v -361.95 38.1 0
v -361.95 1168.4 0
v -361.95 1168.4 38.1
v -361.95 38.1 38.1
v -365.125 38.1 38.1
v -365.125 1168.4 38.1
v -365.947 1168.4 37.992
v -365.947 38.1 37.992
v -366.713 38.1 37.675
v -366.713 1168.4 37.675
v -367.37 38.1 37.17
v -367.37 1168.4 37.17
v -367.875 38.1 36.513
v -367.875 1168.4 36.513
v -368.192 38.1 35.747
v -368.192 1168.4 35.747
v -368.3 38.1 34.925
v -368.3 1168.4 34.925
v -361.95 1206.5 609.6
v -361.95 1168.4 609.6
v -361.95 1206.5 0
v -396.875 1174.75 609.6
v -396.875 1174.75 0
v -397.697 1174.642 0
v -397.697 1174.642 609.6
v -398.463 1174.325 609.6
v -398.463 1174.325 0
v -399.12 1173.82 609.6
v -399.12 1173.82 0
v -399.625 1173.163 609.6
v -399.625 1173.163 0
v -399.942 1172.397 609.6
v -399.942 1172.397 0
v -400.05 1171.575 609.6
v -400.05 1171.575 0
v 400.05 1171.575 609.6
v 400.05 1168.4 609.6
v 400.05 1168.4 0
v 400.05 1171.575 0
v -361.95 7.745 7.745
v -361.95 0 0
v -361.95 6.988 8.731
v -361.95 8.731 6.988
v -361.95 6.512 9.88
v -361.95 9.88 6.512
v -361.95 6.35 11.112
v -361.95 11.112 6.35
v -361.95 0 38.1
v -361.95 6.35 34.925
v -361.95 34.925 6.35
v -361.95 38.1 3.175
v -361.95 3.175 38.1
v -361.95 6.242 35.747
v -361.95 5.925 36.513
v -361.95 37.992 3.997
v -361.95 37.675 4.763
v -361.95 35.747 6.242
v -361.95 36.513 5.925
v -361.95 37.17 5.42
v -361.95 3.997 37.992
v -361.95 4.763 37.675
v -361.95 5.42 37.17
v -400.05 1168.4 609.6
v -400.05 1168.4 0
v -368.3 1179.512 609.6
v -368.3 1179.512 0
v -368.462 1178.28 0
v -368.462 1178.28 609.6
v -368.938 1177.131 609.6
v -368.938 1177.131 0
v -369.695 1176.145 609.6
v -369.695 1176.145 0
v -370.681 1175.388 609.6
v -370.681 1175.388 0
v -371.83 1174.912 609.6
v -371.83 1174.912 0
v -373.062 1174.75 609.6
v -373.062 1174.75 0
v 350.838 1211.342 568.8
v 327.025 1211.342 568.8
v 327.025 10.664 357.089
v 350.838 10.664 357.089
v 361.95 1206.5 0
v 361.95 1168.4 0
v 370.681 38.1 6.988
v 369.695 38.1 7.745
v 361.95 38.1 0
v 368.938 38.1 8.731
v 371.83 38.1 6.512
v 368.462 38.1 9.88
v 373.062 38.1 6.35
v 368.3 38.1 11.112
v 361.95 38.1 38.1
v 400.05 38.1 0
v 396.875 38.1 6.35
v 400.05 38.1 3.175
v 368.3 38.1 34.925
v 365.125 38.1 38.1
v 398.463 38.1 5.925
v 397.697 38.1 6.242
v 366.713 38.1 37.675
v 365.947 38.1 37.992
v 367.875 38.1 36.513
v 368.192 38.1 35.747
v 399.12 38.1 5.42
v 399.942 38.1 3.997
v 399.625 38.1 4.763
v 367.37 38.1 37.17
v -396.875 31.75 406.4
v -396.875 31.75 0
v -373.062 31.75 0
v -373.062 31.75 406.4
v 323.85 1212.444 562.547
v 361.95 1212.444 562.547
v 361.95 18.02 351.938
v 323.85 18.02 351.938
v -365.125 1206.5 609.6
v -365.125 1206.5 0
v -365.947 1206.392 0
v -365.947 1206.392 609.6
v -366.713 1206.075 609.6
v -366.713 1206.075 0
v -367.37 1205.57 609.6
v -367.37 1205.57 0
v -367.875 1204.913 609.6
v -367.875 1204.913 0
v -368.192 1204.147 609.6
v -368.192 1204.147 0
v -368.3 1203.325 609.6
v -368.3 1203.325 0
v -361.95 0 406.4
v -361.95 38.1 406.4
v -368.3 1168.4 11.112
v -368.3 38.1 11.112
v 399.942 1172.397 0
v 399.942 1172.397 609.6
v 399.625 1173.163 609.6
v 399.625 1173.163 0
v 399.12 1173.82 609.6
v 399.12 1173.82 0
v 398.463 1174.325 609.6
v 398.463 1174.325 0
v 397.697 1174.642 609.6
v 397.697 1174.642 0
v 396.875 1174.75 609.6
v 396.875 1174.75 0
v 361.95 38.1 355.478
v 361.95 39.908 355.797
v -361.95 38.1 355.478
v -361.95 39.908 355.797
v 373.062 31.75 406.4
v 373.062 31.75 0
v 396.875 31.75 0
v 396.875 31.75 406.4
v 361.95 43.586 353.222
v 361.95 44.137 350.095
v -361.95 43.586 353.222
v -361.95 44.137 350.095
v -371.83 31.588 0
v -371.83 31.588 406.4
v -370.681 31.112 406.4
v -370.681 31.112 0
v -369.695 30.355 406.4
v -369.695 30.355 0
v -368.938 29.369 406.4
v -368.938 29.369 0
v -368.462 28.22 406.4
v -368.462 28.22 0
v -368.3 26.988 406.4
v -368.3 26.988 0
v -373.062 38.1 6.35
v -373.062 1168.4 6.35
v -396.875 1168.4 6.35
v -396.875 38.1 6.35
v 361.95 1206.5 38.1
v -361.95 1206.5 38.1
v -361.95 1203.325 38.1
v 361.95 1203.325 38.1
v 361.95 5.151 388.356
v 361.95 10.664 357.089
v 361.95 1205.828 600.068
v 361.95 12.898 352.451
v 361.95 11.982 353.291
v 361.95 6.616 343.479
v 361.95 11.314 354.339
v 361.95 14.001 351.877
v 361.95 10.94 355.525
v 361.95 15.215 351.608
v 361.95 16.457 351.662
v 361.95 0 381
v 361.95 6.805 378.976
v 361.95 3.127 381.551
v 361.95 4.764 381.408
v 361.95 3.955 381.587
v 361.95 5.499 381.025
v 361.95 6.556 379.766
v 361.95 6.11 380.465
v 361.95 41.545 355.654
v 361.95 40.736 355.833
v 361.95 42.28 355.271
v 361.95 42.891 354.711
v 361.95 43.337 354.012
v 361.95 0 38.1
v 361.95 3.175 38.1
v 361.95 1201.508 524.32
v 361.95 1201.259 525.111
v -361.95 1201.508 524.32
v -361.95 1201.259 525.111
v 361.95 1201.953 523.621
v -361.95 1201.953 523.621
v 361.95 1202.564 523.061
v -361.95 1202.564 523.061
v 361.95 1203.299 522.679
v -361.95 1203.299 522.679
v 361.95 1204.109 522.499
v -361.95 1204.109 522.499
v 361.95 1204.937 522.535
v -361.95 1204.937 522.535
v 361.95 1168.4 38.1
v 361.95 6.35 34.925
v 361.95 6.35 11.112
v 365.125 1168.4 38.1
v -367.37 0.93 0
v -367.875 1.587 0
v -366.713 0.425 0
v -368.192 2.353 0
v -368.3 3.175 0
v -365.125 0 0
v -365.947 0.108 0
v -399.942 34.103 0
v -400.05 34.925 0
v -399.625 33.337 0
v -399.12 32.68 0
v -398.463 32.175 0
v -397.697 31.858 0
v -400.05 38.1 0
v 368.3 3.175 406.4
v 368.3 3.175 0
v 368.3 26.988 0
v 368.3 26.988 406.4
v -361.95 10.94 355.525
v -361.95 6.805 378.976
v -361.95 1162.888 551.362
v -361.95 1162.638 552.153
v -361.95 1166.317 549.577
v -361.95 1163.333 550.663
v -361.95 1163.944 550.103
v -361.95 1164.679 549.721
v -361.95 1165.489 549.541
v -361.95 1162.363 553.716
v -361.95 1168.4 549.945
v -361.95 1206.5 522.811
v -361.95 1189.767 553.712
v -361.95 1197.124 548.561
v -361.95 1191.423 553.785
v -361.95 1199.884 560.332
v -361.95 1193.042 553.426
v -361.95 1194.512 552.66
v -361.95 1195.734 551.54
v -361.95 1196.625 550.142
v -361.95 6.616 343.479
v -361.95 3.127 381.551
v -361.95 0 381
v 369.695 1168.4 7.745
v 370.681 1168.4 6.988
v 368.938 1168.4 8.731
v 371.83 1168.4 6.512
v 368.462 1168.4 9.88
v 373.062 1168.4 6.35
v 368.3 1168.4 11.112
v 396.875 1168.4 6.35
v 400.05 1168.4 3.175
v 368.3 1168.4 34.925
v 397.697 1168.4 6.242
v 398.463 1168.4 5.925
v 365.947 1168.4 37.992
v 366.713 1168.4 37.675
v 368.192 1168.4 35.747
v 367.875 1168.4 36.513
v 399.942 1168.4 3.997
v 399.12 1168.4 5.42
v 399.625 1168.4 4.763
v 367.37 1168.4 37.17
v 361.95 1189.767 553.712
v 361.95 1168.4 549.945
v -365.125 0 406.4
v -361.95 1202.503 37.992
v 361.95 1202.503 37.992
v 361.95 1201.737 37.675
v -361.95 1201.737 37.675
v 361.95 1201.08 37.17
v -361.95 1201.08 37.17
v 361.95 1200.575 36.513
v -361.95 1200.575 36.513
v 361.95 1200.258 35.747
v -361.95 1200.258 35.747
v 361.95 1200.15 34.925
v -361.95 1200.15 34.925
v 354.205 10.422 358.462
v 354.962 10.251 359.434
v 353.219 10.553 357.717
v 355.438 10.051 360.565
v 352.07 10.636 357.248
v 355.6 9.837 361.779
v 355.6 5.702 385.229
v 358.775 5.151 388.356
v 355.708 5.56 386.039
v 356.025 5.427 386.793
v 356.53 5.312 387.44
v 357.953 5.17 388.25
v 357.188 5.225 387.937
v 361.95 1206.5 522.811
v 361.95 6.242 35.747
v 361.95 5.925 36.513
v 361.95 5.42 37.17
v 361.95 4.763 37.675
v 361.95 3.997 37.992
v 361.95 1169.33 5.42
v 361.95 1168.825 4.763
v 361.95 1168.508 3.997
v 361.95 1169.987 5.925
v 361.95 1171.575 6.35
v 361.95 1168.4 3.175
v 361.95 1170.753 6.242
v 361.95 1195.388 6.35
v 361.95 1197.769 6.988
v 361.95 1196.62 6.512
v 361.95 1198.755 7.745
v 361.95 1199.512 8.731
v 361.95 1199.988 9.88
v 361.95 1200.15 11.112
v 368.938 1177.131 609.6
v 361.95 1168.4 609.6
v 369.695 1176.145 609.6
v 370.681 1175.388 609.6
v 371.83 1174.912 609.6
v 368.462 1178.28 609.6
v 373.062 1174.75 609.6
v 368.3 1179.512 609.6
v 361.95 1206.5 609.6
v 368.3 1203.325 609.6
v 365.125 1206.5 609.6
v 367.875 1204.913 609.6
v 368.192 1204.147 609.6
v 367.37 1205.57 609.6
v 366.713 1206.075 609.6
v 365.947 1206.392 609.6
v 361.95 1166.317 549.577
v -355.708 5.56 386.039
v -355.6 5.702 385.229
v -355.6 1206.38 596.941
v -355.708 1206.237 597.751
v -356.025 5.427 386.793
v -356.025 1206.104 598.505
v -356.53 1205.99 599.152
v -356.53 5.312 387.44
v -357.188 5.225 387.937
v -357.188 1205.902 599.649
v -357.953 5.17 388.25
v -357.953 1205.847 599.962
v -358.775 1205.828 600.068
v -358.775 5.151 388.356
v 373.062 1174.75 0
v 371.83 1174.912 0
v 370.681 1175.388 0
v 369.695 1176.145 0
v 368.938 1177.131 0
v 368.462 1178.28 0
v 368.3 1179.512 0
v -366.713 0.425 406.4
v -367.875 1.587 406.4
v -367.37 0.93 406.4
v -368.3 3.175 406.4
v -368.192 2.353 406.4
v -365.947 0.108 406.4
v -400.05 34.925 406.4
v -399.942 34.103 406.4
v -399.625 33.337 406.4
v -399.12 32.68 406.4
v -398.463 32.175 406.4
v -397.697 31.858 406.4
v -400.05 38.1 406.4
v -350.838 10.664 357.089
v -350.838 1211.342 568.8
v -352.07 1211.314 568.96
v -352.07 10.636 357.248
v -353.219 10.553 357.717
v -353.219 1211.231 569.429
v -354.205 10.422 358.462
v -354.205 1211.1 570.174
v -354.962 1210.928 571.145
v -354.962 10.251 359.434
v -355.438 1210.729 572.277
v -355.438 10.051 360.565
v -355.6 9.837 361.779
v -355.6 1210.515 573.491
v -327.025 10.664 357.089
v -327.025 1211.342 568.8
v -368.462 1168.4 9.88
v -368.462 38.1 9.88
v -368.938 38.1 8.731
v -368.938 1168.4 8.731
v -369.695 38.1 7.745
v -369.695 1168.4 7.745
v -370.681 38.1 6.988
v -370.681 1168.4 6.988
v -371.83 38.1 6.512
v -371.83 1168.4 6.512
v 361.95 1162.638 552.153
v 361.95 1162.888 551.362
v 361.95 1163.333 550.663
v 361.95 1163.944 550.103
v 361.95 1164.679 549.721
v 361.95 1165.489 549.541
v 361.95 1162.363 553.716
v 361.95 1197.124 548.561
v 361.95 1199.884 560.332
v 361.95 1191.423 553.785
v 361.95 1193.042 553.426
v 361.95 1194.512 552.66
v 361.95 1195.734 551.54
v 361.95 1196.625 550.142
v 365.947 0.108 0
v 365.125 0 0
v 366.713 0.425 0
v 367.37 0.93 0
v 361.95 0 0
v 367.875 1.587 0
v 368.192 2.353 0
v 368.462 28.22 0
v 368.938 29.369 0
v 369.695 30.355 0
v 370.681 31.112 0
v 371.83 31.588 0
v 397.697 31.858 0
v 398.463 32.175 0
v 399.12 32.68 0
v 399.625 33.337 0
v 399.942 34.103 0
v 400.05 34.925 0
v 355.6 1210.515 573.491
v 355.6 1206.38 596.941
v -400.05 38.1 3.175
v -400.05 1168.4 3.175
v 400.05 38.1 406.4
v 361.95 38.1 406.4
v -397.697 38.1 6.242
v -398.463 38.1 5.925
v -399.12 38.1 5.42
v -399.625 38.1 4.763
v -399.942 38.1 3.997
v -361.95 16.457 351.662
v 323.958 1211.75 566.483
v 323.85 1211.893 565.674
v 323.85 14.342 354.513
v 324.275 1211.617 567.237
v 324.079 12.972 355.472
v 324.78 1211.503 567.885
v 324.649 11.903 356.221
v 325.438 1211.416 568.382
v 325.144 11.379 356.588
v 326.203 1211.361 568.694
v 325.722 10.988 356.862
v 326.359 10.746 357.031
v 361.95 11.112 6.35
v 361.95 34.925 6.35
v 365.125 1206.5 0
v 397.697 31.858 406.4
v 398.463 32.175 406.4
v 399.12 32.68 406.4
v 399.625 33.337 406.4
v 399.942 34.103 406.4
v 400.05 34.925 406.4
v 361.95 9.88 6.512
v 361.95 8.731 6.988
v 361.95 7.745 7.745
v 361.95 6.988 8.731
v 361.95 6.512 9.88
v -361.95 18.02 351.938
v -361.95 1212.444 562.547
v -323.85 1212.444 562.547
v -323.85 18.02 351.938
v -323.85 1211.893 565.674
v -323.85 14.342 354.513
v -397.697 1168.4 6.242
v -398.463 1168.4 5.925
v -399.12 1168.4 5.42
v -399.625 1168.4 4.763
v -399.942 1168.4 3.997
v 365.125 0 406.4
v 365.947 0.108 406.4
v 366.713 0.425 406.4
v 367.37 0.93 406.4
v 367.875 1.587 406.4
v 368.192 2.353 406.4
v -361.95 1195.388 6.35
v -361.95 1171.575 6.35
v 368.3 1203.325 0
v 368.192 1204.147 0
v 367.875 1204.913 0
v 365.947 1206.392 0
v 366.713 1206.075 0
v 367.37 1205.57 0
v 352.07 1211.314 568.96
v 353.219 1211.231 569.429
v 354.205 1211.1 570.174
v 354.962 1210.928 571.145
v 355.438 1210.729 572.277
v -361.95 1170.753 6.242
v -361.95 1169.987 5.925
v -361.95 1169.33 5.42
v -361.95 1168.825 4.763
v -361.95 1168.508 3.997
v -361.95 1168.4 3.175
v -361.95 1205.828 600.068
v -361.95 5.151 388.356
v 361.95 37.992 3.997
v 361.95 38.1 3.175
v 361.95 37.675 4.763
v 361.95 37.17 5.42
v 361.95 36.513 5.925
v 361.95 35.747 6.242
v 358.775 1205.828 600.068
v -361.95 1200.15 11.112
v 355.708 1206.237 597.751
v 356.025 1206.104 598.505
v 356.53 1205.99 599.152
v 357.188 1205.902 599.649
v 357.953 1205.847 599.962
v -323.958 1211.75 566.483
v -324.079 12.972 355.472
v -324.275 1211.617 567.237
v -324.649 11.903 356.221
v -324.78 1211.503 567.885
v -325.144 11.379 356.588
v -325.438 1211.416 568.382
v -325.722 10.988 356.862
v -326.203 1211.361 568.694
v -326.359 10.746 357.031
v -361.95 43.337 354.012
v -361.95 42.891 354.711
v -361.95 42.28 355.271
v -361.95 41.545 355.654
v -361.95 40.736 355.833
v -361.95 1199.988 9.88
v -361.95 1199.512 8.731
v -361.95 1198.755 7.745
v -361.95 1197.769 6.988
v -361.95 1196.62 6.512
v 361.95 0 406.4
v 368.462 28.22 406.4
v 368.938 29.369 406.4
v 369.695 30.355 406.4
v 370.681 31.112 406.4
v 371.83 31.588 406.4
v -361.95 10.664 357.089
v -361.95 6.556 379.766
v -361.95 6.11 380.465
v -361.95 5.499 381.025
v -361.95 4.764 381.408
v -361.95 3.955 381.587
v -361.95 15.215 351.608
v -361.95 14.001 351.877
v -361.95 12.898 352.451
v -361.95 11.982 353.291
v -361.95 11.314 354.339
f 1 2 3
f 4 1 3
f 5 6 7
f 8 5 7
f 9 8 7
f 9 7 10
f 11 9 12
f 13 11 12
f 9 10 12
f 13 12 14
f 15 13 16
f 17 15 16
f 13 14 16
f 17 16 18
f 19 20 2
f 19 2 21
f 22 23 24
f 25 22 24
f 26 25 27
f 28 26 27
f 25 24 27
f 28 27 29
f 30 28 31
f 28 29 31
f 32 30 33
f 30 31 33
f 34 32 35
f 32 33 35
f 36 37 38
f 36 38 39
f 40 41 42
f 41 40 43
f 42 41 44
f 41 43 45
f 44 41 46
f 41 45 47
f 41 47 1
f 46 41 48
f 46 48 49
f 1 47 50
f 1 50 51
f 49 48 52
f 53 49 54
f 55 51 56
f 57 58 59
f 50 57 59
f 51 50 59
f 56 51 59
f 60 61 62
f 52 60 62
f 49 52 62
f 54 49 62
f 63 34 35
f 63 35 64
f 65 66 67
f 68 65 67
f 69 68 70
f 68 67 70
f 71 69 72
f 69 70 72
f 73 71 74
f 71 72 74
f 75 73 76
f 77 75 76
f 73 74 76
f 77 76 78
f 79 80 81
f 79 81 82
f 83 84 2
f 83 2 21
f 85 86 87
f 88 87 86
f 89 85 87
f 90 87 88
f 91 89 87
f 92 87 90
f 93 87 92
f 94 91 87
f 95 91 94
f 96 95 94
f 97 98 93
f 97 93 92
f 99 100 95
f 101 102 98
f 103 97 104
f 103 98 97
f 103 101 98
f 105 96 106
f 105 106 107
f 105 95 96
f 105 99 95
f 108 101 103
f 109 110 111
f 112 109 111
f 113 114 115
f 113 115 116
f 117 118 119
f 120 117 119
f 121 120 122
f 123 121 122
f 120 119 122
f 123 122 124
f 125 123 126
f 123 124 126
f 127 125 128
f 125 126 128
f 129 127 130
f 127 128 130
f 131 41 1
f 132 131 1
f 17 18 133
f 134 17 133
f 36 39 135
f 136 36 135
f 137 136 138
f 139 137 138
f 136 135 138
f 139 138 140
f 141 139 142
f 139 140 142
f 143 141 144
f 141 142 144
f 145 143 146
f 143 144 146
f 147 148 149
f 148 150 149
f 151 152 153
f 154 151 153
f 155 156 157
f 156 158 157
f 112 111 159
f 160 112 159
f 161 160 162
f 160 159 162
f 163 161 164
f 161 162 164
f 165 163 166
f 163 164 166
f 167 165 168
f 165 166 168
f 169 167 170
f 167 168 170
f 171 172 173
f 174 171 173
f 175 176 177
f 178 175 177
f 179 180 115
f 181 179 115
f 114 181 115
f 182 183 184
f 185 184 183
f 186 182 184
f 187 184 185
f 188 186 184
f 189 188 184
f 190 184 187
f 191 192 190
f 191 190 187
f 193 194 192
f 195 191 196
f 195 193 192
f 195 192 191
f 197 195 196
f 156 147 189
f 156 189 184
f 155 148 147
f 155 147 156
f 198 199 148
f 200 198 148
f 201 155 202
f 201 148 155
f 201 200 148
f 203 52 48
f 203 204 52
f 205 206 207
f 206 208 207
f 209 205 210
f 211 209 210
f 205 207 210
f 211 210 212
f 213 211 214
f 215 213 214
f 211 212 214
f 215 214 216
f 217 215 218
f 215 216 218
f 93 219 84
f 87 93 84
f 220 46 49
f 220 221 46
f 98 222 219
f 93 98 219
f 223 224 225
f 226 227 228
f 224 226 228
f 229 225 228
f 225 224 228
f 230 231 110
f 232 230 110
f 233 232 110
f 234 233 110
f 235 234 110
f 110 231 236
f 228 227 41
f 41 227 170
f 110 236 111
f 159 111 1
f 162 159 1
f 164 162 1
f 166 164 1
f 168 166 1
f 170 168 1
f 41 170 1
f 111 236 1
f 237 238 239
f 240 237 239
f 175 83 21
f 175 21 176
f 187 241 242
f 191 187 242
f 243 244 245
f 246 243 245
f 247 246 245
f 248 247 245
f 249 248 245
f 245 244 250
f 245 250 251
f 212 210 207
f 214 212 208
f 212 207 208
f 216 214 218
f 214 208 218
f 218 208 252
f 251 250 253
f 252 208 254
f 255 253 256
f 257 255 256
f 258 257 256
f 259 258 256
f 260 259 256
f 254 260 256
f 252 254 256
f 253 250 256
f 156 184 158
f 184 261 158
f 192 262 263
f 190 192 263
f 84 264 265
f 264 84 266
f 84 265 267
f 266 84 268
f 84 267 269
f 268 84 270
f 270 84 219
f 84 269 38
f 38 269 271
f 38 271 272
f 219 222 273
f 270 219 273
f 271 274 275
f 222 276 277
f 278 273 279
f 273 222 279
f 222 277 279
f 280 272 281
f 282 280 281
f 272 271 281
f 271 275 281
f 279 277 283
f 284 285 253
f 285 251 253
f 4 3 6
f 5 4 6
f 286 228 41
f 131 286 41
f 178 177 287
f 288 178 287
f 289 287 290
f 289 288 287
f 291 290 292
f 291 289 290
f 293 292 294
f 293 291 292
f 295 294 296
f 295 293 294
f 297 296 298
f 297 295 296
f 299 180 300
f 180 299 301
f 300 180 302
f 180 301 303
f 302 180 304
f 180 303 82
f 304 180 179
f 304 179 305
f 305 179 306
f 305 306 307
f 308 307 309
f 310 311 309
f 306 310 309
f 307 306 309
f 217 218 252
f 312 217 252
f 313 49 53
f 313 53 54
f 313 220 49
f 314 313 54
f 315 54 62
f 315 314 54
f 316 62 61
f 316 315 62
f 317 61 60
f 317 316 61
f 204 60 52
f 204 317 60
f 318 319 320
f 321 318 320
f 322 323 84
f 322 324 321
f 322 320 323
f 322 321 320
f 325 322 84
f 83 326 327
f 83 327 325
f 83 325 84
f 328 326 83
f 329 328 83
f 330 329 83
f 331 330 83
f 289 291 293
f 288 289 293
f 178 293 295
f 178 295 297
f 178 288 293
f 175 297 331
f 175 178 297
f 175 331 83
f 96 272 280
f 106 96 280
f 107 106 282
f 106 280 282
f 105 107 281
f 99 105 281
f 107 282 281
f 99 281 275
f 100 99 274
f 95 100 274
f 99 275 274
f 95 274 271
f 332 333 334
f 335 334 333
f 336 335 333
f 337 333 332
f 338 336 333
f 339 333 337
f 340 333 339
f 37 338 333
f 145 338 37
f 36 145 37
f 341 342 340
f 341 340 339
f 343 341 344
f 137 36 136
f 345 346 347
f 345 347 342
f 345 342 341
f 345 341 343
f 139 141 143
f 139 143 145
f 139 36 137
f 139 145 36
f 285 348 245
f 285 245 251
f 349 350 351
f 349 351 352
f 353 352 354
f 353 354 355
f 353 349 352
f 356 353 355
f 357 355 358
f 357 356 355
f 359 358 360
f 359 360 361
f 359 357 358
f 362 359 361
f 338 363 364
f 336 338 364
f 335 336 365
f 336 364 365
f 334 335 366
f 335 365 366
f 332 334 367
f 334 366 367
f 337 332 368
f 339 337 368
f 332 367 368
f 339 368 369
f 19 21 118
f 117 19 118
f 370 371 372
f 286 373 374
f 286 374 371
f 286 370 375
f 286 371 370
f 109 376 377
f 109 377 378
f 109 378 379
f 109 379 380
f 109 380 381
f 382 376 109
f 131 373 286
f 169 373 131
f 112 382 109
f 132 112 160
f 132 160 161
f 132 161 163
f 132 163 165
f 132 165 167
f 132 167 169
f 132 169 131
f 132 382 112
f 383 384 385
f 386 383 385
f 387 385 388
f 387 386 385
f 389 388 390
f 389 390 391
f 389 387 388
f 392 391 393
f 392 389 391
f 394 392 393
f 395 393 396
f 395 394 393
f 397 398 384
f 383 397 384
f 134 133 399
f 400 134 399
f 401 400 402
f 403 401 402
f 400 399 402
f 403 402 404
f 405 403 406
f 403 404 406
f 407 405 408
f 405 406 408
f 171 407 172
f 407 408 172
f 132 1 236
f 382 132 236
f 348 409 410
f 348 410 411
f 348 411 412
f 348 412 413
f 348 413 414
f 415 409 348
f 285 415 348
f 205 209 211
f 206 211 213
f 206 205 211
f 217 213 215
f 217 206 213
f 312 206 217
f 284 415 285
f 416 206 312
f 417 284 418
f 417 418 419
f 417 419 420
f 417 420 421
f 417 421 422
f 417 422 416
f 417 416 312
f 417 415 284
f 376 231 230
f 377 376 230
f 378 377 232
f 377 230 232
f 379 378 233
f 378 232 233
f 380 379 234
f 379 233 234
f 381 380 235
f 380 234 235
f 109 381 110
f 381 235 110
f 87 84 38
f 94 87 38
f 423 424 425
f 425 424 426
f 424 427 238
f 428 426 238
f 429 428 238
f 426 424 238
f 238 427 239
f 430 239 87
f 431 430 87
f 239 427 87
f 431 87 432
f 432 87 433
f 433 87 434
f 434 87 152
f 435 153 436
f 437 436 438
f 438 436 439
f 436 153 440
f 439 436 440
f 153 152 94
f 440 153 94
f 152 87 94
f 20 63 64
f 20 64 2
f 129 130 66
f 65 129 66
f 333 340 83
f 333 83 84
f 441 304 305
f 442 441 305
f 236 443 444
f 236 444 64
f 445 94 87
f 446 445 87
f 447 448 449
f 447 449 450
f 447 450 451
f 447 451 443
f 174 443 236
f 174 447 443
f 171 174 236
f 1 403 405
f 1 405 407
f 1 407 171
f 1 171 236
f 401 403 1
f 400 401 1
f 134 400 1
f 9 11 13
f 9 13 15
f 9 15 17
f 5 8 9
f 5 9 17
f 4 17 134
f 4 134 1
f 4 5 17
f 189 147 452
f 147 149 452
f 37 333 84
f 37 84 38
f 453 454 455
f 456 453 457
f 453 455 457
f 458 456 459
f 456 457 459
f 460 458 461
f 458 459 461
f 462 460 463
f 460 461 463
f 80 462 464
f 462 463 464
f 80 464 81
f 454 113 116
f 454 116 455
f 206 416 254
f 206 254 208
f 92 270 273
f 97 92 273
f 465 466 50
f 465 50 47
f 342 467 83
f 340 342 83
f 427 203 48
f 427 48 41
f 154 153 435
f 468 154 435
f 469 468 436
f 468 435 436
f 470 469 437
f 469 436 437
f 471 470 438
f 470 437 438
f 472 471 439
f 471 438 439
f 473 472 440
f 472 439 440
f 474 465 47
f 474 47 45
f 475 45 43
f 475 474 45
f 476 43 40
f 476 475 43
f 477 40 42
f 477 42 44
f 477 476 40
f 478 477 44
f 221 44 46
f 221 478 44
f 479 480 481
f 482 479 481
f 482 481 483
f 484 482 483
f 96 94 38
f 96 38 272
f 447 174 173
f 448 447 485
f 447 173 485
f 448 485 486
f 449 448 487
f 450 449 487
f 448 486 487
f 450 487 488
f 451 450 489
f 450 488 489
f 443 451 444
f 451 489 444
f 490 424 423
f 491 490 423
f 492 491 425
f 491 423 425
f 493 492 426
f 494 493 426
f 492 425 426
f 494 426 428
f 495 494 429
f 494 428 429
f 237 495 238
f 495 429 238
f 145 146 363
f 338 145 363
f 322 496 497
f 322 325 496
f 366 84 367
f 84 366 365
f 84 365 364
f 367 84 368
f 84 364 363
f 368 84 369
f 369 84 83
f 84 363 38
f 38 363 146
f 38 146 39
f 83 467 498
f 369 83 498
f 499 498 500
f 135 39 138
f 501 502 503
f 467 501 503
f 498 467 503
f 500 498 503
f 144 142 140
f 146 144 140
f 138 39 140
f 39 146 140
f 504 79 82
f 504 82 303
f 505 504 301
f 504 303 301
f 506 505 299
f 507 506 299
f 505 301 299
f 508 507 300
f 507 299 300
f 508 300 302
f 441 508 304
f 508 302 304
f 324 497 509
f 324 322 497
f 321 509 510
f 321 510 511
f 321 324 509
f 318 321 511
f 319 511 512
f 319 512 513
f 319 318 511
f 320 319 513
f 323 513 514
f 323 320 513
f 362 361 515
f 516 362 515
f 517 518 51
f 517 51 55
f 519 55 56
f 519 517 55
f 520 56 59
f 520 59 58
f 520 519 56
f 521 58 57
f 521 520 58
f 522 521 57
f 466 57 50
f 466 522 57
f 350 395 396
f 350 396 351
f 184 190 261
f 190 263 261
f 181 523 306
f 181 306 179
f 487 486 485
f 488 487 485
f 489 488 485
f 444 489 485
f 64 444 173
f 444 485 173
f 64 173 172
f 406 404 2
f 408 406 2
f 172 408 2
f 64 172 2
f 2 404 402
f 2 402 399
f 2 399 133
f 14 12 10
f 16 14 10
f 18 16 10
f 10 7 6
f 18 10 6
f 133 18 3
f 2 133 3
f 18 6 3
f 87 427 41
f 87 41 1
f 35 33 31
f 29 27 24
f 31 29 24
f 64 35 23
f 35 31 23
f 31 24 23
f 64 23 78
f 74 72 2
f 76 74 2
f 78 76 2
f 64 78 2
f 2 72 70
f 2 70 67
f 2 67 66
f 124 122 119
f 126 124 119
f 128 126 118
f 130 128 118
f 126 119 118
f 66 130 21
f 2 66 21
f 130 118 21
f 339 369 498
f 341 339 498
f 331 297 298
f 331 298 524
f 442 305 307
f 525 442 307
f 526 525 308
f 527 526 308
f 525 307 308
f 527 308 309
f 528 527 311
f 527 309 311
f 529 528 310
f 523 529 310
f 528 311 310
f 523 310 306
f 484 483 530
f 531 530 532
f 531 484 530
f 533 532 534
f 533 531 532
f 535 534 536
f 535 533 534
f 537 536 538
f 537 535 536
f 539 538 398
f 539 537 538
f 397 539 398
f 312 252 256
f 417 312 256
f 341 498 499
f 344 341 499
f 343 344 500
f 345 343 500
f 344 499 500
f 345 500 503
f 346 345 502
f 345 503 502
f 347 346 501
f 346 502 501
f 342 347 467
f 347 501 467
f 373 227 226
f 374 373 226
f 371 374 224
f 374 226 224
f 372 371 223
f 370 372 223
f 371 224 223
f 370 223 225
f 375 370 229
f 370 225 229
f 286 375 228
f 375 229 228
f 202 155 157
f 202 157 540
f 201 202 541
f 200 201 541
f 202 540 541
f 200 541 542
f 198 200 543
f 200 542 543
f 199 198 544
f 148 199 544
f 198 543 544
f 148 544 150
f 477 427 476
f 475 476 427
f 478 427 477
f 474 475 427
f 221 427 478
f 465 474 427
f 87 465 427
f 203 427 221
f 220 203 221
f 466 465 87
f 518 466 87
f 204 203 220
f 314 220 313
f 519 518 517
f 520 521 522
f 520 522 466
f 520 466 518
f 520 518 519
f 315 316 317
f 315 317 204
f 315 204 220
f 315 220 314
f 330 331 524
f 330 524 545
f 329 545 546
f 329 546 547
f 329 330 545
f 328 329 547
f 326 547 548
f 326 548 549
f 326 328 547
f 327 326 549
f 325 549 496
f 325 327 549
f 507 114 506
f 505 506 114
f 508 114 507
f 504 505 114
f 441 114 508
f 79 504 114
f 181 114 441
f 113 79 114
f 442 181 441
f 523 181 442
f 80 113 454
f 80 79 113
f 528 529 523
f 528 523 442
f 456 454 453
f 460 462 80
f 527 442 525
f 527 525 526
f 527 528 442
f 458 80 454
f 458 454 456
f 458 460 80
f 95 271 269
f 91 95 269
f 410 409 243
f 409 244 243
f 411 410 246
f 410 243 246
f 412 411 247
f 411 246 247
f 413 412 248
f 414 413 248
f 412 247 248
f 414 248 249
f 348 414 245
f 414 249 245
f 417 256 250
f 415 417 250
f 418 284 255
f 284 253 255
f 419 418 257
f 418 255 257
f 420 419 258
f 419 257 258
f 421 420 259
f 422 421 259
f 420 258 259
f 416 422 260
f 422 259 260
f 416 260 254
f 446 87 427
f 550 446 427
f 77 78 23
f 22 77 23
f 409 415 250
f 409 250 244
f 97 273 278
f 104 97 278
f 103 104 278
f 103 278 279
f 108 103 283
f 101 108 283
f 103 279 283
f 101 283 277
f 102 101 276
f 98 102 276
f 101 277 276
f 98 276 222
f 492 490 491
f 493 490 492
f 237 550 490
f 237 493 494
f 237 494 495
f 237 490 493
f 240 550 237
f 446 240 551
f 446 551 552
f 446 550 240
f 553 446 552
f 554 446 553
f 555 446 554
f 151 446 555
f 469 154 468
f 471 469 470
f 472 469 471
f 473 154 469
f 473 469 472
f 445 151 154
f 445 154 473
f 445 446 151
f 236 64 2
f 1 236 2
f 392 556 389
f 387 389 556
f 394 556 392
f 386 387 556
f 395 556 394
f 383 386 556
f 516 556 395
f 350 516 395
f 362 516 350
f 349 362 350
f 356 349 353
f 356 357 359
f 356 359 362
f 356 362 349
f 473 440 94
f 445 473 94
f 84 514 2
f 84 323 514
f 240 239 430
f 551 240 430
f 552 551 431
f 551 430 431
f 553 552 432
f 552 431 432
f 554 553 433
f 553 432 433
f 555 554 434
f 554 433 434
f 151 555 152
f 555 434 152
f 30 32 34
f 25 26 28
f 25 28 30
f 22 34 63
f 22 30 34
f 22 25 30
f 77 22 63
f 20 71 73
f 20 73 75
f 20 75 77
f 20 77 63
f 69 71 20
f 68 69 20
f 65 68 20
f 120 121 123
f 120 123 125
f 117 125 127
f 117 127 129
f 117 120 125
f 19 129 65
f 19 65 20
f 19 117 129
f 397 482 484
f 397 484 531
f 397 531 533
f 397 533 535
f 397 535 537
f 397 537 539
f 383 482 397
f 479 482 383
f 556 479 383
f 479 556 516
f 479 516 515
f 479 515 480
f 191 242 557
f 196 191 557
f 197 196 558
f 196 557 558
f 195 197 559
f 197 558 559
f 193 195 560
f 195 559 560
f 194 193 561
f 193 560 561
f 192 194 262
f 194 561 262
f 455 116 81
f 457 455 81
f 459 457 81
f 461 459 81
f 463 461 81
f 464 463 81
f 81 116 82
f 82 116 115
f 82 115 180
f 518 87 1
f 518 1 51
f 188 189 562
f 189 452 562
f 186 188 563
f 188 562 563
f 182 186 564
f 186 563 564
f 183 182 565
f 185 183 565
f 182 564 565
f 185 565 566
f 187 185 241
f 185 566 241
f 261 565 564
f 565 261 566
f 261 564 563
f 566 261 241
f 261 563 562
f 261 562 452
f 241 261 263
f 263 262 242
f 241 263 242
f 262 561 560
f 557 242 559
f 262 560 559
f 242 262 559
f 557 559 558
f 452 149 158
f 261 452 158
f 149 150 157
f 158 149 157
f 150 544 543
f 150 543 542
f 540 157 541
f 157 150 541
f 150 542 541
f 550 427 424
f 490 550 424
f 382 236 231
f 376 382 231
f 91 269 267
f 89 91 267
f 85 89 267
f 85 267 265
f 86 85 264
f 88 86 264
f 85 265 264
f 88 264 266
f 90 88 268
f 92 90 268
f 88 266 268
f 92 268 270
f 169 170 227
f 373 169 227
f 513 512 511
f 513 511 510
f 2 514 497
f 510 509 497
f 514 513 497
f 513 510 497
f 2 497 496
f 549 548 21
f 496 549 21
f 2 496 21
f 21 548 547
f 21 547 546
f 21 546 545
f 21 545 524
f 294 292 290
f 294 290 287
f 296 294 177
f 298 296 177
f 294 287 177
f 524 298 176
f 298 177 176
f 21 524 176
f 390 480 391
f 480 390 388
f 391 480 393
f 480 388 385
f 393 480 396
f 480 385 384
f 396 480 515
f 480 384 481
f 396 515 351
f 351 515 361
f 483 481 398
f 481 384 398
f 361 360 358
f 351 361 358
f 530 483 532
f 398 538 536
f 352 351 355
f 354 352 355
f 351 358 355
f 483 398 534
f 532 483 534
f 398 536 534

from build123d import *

# Parameters (mm, degrees)
F2_DEPTH       = 406.4
F3_DEPTH       = 609.6
F4_DEPTH       = 361.95
F4_DEPTH_BACK  = 361.95
F6_DEPTH       = 1219.2
F8_DEPTH       = 762.001
F11_DEPTH      = 361.95
F11_DEPTH_BACK = 361.95
F13_DEPTH      = 1130.3


with BuildPart() as f2:
    # F1 (on Top) → F2 (new body)
    with BuildSketch(Plane.XY):
        with BuildLine():
            ThreePointArc((-368.3, 3.175), (-367.3700640303, 0.9299359697), (-365.125, 0))
            Line((-365.125, 0), (-361.95, 0))
            Line((-361.95, 0), (-361.95, 38.1))
            Line((-361.95, 38.1), (-400.05, 38.1))
            Line((-400.05, 38.1), (-400.05, 34.925))
            ThreePointArc((-400.05, 34.925), (-399.1200640303, 32.6799359697), (-396.875, 31.75))
            Line((-396.875, 31.75), (-373.0625, 31.75))
            ThreePointArc((-373.0625, 31.75), (-369.6949039546, 30.3550960454), (-368.3, 26.9875))
            Line((-368.3, 26.9875), (-368.3, 3.175))
        make_face()
    extrude(amount=F2_DEPTH)


with BuildPart() as f2b:
    # F1 (on Top) → F2, piece 2 (new body)
    with BuildSketch(Plane.XY):
        with BuildLine():
            Line((361.95, 38.1), (361.95, 0))
            Line((361.95, 0), (365.125, 0))
            ThreePointArc((365.125, 0), (367.3700640303, 0.9299359697), (368.3, 3.175))
            Line((368.3, 3.175), (368.3, 26.9875))
            ThreePointArc((368.3, 26.9875), (369.6949039546, 30.3550960454), (373.0625, 31.75))
            Line((373.0625, 31.75), (396.875, 31.75))
            ThreePointArc((396.875, 31.75), (399.1200640303, 32.6799359697), (400.05, 34.925))
            Line((400.05, 34.925), (400.05, 38.1))
            Line((400.05, 38.1), (361.95, 38.1))
        make_face()
    extrude(amount=F2_DEPTH)


with BuildPart() as f3:
    # F1 (on Top) → F3 (new body)
    with BuildSketch(Plane.XY):
        with BuildLine():
            Line((-361.95, 1206.5), (-365.125, 1206.5))
            ThreePointArc((-365.125, 1206.5), (-367.3700640303, 1205.5700640303), (-368.3, 1203.325))
            Line((-368.3, 1203.325), (-368.3, 1179.5125))
            ThreePointArc((-368.3, 1179.5125), (-369.6949039546, 1176.1449039546), (-373.0625, 1174.75))
            Line((-373.0625, 1174.75), (-396.875, 1174.75))
            ThreePointArc((-396.875, 1174.75), (-399.1200640303, 1173.8200640303), (-400.05, 1171.575))
            Line((-400.05, 1171.575), (-400.05, 1168.4))
            Line((-400.05, 1168.4), (-361.95, 1168.4))
            Line((-361.95, 1168.4), (-361.95, 1206.5))
        make_face()
    extrude(amount=F3_DEPTH)


with BuildPart() as f3b:
    # F1 (on Top) → F3, piece 2 (new body)
    with BuildSketch(Plane.XY):
        with BuildLine():
            ThreePointArc((368.3, 1203.325), (367.3700640303, 1205.5700640303), (365.125, 1206.5))
            Line((365.125, 1206.5), (361.95, 1206.5))
            Line((361.95, 1206.5), (361.95, 1168.4))
            Line((361.95, 1168.4), (400.05, 1168.4))
            Line((400.05, 1168.4), (400.05, 1171.575))
            ThreePointArc((400.05, 1171.575), (399.1200640303, 1173.8200640303), (396.875, 1174.75))
            Line((396.875, 1174.75), (373.0625, 1174.75))
            ThreePointArc((373.0625, 1174.75), (369.6949039546, 1176.1449039546), (368.3, 1179.5125))
            Line((368.3, 1179.5125), (368.3, 1203.325))
        make_face()
    extrude(amount=F3_DEPTH)


with BuildPart() as f4:
    # F0 (on Right) → F4 (new body, two sides)
    with BuildSketch(Plane.YZ) as f4_sk:
        with BuildLine():
            Line((3.1267646158, 381.5513329641), (0, 381))
            Line((0, 381), (6.6159955691, 343.4788246102))
            Line((6.6159955691, 343.4788246102), (38.1, 349.0303040521))
            Line((38.1, 349.0303040521), (38.1, 355.4782630376))
            Line((38.1, 355.4782630376), (16.4570057963, 351.6620192162))
            ThreePointArc((16.4570057963, 351.6620192162), (12.898348572, 352.450954529), (10.9398594264, 355.5251666938))
            Line((10.9398594264, 355.5251666938), (6.8048621957, 378.9759013124))
            ThreePointArc((6.8048621957, 378.9759013124), (5.4992027653, 381.0253760889), (3.1267646158, 381.5513329641))
        make_face()
        with BuildLine():
            Line((38.1, 355.4782630376), (38.1, 349.0303040521))
            Line((38.1, 349.0303040521), (44.1371709589, 350.0948201793))
            Line((44.1371709589, 350.0948201793), (43.5858379948, 353.2215847952))
            ThreePointArc((43.5858379948, 353.2215847952), (42.2801785644, 355.2710595717), (39.9077404149, 355.7970164469))
            Line((39.9077404149, 355.7970164469), (38.1, 355.4782630376))
        make_face()
    extrude(amount=-F4_DEPTH)
    extrude(f4_sk.sketch, amount=F4_DEPTH_BACK)


with BuildPart() as f4b:
    # F0 (on Right) → F4, piece 2 (new body, two sides)
    with BuildSketch(Plane.YZ) as f4_2_sk:
        with BuildLine():
            Line((1199.8840044309, 560.3321287743), (1168.4, 554.7806493324))
            Line((1168.4, 554.7806493324), (1168.4, 549.9446800933))
            Line((1168.4, 549.9446800933), (1189.7673277217, 553.7123164763))
            ThreePointArc((1189.7673277217, 553.7123164763), (1194.5122040207, 552.6604027259), (1197.1235228815, 548.5614531728))
            Line((1197.1235228815, 548.5614531728), (1201.2585201122, 525.1107185542))
            ThreePointArc((1201.2585201122, 525.1107185542), (1202.5641795426, 523.0612437777), (1204.9366176921, 522.5352869025))
            Line((1204.9366176921, 522.5352869025), (1206.5, 522.8109533845))
            Line((1206.5, 522.8109533845), (1199.8840044309, 560.3321287743))
        make_face()
        with BuildLine():
            Line((1168.4, 554.7806493324), (1162.3628290411, 553.7161332052))
            Line((1162.3628290411, 553.7161332052), (1162.6384955232, 552.1527508973))
            ThreePointArc((1162.6384955232, 552.1527508973), (1163.9441549536, 550.1032761208), (1166.3165931031, 549.5773192456))
            Line((1166.3165931031, 549.5773192456), (1168.4, 549.9446800933))
            Line((1168.4, 549.9446800933), (1168.4, 554.7806493324))
        make_face()
    extrude(amount=-F4_DEPTH)
    extrude(f4_2_sk.sketch, amount=F4_DEPTH_BACK)


with BuildPart() as f6:
    # F5 (on face) → F6 (new body)
    with BuildSketch(Plane(origin=(0, 71.4083665352, 12.5912216685), x_dir=(-1, 0, 0), z_dir=(0, 0.984807753, 0.1736481777))):
        with BuildLine():
            Line((-358.775, 381.5617538977), (-361.95, 381.5617538977))
            Line((-361.95, 381.5617538977), (-361.95, 343.4617538977))
            Line((-361.95, 343.4617538977), (-323.85, 343.4617538977))
            Line((-323.85, 343.4617538977), (-323.85, 346.6367538977))
            ThreePointArc((-323.85, 346.6367538977), (-324.7799359697, 348.8818179279), (-327.025, 349.8117538977))
            Line((-327.025, 349.8117538977), (-350.8375, 349.8117538977))
            ThreePointArc((-350.8375, 349.8117538977), (-354.2050960454, 351.2066578523), (-355.6, 354.5742538977))
            Line((-355.6, 354.5742538977), (-355.6, 378.3867538977))
            ThreePointArc((-355.6, 378.3867538977), (-356.5299359697, 380.6318179279), (-358.775, 381.5617538977))
        make_face()
    extrude(amount=F6_DEPTH)

    # F7 (on face) → F8 (cut, through all)
    with BuildSketch(Plane.YZ.offset(361.95)):
        Polygon((10.6641929444, 357.0885490017), (11.7668588726, 350.83501977), (18.0203881042, 351.9376856982), align=None)
    extrude(amount=-F8_DEPTH, mode=Mode.SUBTRACT)


with BuildPart() as f9_1:
    # F9: instance of F6
    add(f6.part.mirror(Plane.YZ))


with BuildPart() as f11:
    # F10 (on Right) → F11 (new body, two sides)
    with BuildSketch(Plane.YZ) as f11_sk:
        with BuildLine():
            Line((3.175, 38.1), (0, 38.1))
            Line((0, 38.1), (0, 0))
            Line((0, 0), (38.1, 0))
            Line((38.1, 0), (38.1, 3.175))
            ThreePointArc((38.1, 3.175), (37.1700640303, 5.4200640303), (34.925, 6.35))
            Line((34.925, 6.35), (11.1125, 6.35))
            ThreePointArc((11.1125, 6.35), (7.7449039546, 7.7449039546), (6.35, 11.1125))
            Line((6.35, 11.1125), (6.35, 34.925))
            ThreePointArc((6.35, 34.925), (5.4200640303, 37.1700640303), (3.175, 38.1))
        make_face()
    extrude(amount=F11_DEPTH)
    extrude(f11_sk.sketch, amount=-F11_DEPTH_BACK)


with BuildPart() as f11b:
    # F10 (on Right) → F11, piece 2 (new body, two sides)
    with BuildSketch(Plane.YZ) as f11_2_sk:
        with BuildLine():
            Line((1168.4, 3.175), (1168.4, 0))
            Line((1168.4, 0), (1206.5, 0))
            Line((1206.5, 0), (1206.5, 38.1))
            Line((1206.5, 38.1), (1203.325, 38.1))
            ThreePointArc((1203.325, 38.1), (1201.0799359697, 37.1700640303), (1200.15, 34.925))
            Line((1200.15, 34.925), (1200.15, 11.1125))
            ThreePointArc((1200.15, 11.1125), (1198.7550960454, 7.7449039546), (1195.3875, 6.35))
            Line((1195.3875, 6.35), (1171.575, 6.35))
            ThreePointArc((1171.575, 6.35), (1169.3299359697, 5.4200640303), (1168.4, 3.175))
        make_face()
    extrude(amount=F11_DEPTH)
    extrude(f11_2_sk.sketch, amount=-F11_DEPTH_BACK)


with BuildPart() as f13:
    # F12 (on face) → F13 (new body, through all)
    with BuildSketch(Plane.XZ.offset(-1168.4)):
        with BuildLine():
            Line((365.125, 38.1), (361.95, 38.1))
            Line((361.95, 38.1), (361.95, 0))
            Line((361.95, 0), (400.05, 0))
            Line((400.05, 0), (400.05, 3.175))
            ThreePointArc((400.05, 3.175), (399.1200640303, 5.4200640303), (396.875, 6.35))
            Line((396.875, 6.35), (373.0625, 6.35))
            ThreePointArc((373.0625, 6.35), (369.6949039546, 7.7449039546), (368.3, 11.1125))
            Line((368.3, 11.1125), (368.3, 34.925))
            ThreePointArc((368.3, 34.925), (367.3700640303, 37.1700640303), (365.125, 38.1))
        make_face()
    extrude(amount=F13_DEPTH)


with BuildPart() as f13b:
    # F12 (on face) → F13, piece 2 (new body, through all)
    with BuildSketch(Plane.XZ.offset(-1168.4)):
        with BuildLine():
            Line((-400.05, 3.175), (-400.05, 0))
            Line((-400.05, 0), (-361.95, 0))
            Line((-361.95, 0), (-361.95, 38.1))
            Line((-361.95, 38.1), (-365.125, 38.1))
            ThreePointArc((-365.125, 38.1), (-367.3700640303, 37.1700640303), (-368.3, 34.925))
            Line((-368.3, 34.925), (-368.3, 11.1125))
            ThreePointArc((-368.3, 11.1125), (-369.6949039546, 7.7449039546), (-373.0625, 6.35))
            Line((-373.0625, 6.35), (-396.875, 6.35))
            ThreePointArc((-396.875, 6.35), (-399.1200640303, 5.4200640303), (-400.05, 3.175))
        make_face()
    extrude(amount=F13_DEPTH)


solid = Compound([f2.part, f2b.part, f3.part, f3b.part, f4.part, f4b.part, f6.part, f9_1.part, f11.part, f11b.part, f13.part, f13b.part])
